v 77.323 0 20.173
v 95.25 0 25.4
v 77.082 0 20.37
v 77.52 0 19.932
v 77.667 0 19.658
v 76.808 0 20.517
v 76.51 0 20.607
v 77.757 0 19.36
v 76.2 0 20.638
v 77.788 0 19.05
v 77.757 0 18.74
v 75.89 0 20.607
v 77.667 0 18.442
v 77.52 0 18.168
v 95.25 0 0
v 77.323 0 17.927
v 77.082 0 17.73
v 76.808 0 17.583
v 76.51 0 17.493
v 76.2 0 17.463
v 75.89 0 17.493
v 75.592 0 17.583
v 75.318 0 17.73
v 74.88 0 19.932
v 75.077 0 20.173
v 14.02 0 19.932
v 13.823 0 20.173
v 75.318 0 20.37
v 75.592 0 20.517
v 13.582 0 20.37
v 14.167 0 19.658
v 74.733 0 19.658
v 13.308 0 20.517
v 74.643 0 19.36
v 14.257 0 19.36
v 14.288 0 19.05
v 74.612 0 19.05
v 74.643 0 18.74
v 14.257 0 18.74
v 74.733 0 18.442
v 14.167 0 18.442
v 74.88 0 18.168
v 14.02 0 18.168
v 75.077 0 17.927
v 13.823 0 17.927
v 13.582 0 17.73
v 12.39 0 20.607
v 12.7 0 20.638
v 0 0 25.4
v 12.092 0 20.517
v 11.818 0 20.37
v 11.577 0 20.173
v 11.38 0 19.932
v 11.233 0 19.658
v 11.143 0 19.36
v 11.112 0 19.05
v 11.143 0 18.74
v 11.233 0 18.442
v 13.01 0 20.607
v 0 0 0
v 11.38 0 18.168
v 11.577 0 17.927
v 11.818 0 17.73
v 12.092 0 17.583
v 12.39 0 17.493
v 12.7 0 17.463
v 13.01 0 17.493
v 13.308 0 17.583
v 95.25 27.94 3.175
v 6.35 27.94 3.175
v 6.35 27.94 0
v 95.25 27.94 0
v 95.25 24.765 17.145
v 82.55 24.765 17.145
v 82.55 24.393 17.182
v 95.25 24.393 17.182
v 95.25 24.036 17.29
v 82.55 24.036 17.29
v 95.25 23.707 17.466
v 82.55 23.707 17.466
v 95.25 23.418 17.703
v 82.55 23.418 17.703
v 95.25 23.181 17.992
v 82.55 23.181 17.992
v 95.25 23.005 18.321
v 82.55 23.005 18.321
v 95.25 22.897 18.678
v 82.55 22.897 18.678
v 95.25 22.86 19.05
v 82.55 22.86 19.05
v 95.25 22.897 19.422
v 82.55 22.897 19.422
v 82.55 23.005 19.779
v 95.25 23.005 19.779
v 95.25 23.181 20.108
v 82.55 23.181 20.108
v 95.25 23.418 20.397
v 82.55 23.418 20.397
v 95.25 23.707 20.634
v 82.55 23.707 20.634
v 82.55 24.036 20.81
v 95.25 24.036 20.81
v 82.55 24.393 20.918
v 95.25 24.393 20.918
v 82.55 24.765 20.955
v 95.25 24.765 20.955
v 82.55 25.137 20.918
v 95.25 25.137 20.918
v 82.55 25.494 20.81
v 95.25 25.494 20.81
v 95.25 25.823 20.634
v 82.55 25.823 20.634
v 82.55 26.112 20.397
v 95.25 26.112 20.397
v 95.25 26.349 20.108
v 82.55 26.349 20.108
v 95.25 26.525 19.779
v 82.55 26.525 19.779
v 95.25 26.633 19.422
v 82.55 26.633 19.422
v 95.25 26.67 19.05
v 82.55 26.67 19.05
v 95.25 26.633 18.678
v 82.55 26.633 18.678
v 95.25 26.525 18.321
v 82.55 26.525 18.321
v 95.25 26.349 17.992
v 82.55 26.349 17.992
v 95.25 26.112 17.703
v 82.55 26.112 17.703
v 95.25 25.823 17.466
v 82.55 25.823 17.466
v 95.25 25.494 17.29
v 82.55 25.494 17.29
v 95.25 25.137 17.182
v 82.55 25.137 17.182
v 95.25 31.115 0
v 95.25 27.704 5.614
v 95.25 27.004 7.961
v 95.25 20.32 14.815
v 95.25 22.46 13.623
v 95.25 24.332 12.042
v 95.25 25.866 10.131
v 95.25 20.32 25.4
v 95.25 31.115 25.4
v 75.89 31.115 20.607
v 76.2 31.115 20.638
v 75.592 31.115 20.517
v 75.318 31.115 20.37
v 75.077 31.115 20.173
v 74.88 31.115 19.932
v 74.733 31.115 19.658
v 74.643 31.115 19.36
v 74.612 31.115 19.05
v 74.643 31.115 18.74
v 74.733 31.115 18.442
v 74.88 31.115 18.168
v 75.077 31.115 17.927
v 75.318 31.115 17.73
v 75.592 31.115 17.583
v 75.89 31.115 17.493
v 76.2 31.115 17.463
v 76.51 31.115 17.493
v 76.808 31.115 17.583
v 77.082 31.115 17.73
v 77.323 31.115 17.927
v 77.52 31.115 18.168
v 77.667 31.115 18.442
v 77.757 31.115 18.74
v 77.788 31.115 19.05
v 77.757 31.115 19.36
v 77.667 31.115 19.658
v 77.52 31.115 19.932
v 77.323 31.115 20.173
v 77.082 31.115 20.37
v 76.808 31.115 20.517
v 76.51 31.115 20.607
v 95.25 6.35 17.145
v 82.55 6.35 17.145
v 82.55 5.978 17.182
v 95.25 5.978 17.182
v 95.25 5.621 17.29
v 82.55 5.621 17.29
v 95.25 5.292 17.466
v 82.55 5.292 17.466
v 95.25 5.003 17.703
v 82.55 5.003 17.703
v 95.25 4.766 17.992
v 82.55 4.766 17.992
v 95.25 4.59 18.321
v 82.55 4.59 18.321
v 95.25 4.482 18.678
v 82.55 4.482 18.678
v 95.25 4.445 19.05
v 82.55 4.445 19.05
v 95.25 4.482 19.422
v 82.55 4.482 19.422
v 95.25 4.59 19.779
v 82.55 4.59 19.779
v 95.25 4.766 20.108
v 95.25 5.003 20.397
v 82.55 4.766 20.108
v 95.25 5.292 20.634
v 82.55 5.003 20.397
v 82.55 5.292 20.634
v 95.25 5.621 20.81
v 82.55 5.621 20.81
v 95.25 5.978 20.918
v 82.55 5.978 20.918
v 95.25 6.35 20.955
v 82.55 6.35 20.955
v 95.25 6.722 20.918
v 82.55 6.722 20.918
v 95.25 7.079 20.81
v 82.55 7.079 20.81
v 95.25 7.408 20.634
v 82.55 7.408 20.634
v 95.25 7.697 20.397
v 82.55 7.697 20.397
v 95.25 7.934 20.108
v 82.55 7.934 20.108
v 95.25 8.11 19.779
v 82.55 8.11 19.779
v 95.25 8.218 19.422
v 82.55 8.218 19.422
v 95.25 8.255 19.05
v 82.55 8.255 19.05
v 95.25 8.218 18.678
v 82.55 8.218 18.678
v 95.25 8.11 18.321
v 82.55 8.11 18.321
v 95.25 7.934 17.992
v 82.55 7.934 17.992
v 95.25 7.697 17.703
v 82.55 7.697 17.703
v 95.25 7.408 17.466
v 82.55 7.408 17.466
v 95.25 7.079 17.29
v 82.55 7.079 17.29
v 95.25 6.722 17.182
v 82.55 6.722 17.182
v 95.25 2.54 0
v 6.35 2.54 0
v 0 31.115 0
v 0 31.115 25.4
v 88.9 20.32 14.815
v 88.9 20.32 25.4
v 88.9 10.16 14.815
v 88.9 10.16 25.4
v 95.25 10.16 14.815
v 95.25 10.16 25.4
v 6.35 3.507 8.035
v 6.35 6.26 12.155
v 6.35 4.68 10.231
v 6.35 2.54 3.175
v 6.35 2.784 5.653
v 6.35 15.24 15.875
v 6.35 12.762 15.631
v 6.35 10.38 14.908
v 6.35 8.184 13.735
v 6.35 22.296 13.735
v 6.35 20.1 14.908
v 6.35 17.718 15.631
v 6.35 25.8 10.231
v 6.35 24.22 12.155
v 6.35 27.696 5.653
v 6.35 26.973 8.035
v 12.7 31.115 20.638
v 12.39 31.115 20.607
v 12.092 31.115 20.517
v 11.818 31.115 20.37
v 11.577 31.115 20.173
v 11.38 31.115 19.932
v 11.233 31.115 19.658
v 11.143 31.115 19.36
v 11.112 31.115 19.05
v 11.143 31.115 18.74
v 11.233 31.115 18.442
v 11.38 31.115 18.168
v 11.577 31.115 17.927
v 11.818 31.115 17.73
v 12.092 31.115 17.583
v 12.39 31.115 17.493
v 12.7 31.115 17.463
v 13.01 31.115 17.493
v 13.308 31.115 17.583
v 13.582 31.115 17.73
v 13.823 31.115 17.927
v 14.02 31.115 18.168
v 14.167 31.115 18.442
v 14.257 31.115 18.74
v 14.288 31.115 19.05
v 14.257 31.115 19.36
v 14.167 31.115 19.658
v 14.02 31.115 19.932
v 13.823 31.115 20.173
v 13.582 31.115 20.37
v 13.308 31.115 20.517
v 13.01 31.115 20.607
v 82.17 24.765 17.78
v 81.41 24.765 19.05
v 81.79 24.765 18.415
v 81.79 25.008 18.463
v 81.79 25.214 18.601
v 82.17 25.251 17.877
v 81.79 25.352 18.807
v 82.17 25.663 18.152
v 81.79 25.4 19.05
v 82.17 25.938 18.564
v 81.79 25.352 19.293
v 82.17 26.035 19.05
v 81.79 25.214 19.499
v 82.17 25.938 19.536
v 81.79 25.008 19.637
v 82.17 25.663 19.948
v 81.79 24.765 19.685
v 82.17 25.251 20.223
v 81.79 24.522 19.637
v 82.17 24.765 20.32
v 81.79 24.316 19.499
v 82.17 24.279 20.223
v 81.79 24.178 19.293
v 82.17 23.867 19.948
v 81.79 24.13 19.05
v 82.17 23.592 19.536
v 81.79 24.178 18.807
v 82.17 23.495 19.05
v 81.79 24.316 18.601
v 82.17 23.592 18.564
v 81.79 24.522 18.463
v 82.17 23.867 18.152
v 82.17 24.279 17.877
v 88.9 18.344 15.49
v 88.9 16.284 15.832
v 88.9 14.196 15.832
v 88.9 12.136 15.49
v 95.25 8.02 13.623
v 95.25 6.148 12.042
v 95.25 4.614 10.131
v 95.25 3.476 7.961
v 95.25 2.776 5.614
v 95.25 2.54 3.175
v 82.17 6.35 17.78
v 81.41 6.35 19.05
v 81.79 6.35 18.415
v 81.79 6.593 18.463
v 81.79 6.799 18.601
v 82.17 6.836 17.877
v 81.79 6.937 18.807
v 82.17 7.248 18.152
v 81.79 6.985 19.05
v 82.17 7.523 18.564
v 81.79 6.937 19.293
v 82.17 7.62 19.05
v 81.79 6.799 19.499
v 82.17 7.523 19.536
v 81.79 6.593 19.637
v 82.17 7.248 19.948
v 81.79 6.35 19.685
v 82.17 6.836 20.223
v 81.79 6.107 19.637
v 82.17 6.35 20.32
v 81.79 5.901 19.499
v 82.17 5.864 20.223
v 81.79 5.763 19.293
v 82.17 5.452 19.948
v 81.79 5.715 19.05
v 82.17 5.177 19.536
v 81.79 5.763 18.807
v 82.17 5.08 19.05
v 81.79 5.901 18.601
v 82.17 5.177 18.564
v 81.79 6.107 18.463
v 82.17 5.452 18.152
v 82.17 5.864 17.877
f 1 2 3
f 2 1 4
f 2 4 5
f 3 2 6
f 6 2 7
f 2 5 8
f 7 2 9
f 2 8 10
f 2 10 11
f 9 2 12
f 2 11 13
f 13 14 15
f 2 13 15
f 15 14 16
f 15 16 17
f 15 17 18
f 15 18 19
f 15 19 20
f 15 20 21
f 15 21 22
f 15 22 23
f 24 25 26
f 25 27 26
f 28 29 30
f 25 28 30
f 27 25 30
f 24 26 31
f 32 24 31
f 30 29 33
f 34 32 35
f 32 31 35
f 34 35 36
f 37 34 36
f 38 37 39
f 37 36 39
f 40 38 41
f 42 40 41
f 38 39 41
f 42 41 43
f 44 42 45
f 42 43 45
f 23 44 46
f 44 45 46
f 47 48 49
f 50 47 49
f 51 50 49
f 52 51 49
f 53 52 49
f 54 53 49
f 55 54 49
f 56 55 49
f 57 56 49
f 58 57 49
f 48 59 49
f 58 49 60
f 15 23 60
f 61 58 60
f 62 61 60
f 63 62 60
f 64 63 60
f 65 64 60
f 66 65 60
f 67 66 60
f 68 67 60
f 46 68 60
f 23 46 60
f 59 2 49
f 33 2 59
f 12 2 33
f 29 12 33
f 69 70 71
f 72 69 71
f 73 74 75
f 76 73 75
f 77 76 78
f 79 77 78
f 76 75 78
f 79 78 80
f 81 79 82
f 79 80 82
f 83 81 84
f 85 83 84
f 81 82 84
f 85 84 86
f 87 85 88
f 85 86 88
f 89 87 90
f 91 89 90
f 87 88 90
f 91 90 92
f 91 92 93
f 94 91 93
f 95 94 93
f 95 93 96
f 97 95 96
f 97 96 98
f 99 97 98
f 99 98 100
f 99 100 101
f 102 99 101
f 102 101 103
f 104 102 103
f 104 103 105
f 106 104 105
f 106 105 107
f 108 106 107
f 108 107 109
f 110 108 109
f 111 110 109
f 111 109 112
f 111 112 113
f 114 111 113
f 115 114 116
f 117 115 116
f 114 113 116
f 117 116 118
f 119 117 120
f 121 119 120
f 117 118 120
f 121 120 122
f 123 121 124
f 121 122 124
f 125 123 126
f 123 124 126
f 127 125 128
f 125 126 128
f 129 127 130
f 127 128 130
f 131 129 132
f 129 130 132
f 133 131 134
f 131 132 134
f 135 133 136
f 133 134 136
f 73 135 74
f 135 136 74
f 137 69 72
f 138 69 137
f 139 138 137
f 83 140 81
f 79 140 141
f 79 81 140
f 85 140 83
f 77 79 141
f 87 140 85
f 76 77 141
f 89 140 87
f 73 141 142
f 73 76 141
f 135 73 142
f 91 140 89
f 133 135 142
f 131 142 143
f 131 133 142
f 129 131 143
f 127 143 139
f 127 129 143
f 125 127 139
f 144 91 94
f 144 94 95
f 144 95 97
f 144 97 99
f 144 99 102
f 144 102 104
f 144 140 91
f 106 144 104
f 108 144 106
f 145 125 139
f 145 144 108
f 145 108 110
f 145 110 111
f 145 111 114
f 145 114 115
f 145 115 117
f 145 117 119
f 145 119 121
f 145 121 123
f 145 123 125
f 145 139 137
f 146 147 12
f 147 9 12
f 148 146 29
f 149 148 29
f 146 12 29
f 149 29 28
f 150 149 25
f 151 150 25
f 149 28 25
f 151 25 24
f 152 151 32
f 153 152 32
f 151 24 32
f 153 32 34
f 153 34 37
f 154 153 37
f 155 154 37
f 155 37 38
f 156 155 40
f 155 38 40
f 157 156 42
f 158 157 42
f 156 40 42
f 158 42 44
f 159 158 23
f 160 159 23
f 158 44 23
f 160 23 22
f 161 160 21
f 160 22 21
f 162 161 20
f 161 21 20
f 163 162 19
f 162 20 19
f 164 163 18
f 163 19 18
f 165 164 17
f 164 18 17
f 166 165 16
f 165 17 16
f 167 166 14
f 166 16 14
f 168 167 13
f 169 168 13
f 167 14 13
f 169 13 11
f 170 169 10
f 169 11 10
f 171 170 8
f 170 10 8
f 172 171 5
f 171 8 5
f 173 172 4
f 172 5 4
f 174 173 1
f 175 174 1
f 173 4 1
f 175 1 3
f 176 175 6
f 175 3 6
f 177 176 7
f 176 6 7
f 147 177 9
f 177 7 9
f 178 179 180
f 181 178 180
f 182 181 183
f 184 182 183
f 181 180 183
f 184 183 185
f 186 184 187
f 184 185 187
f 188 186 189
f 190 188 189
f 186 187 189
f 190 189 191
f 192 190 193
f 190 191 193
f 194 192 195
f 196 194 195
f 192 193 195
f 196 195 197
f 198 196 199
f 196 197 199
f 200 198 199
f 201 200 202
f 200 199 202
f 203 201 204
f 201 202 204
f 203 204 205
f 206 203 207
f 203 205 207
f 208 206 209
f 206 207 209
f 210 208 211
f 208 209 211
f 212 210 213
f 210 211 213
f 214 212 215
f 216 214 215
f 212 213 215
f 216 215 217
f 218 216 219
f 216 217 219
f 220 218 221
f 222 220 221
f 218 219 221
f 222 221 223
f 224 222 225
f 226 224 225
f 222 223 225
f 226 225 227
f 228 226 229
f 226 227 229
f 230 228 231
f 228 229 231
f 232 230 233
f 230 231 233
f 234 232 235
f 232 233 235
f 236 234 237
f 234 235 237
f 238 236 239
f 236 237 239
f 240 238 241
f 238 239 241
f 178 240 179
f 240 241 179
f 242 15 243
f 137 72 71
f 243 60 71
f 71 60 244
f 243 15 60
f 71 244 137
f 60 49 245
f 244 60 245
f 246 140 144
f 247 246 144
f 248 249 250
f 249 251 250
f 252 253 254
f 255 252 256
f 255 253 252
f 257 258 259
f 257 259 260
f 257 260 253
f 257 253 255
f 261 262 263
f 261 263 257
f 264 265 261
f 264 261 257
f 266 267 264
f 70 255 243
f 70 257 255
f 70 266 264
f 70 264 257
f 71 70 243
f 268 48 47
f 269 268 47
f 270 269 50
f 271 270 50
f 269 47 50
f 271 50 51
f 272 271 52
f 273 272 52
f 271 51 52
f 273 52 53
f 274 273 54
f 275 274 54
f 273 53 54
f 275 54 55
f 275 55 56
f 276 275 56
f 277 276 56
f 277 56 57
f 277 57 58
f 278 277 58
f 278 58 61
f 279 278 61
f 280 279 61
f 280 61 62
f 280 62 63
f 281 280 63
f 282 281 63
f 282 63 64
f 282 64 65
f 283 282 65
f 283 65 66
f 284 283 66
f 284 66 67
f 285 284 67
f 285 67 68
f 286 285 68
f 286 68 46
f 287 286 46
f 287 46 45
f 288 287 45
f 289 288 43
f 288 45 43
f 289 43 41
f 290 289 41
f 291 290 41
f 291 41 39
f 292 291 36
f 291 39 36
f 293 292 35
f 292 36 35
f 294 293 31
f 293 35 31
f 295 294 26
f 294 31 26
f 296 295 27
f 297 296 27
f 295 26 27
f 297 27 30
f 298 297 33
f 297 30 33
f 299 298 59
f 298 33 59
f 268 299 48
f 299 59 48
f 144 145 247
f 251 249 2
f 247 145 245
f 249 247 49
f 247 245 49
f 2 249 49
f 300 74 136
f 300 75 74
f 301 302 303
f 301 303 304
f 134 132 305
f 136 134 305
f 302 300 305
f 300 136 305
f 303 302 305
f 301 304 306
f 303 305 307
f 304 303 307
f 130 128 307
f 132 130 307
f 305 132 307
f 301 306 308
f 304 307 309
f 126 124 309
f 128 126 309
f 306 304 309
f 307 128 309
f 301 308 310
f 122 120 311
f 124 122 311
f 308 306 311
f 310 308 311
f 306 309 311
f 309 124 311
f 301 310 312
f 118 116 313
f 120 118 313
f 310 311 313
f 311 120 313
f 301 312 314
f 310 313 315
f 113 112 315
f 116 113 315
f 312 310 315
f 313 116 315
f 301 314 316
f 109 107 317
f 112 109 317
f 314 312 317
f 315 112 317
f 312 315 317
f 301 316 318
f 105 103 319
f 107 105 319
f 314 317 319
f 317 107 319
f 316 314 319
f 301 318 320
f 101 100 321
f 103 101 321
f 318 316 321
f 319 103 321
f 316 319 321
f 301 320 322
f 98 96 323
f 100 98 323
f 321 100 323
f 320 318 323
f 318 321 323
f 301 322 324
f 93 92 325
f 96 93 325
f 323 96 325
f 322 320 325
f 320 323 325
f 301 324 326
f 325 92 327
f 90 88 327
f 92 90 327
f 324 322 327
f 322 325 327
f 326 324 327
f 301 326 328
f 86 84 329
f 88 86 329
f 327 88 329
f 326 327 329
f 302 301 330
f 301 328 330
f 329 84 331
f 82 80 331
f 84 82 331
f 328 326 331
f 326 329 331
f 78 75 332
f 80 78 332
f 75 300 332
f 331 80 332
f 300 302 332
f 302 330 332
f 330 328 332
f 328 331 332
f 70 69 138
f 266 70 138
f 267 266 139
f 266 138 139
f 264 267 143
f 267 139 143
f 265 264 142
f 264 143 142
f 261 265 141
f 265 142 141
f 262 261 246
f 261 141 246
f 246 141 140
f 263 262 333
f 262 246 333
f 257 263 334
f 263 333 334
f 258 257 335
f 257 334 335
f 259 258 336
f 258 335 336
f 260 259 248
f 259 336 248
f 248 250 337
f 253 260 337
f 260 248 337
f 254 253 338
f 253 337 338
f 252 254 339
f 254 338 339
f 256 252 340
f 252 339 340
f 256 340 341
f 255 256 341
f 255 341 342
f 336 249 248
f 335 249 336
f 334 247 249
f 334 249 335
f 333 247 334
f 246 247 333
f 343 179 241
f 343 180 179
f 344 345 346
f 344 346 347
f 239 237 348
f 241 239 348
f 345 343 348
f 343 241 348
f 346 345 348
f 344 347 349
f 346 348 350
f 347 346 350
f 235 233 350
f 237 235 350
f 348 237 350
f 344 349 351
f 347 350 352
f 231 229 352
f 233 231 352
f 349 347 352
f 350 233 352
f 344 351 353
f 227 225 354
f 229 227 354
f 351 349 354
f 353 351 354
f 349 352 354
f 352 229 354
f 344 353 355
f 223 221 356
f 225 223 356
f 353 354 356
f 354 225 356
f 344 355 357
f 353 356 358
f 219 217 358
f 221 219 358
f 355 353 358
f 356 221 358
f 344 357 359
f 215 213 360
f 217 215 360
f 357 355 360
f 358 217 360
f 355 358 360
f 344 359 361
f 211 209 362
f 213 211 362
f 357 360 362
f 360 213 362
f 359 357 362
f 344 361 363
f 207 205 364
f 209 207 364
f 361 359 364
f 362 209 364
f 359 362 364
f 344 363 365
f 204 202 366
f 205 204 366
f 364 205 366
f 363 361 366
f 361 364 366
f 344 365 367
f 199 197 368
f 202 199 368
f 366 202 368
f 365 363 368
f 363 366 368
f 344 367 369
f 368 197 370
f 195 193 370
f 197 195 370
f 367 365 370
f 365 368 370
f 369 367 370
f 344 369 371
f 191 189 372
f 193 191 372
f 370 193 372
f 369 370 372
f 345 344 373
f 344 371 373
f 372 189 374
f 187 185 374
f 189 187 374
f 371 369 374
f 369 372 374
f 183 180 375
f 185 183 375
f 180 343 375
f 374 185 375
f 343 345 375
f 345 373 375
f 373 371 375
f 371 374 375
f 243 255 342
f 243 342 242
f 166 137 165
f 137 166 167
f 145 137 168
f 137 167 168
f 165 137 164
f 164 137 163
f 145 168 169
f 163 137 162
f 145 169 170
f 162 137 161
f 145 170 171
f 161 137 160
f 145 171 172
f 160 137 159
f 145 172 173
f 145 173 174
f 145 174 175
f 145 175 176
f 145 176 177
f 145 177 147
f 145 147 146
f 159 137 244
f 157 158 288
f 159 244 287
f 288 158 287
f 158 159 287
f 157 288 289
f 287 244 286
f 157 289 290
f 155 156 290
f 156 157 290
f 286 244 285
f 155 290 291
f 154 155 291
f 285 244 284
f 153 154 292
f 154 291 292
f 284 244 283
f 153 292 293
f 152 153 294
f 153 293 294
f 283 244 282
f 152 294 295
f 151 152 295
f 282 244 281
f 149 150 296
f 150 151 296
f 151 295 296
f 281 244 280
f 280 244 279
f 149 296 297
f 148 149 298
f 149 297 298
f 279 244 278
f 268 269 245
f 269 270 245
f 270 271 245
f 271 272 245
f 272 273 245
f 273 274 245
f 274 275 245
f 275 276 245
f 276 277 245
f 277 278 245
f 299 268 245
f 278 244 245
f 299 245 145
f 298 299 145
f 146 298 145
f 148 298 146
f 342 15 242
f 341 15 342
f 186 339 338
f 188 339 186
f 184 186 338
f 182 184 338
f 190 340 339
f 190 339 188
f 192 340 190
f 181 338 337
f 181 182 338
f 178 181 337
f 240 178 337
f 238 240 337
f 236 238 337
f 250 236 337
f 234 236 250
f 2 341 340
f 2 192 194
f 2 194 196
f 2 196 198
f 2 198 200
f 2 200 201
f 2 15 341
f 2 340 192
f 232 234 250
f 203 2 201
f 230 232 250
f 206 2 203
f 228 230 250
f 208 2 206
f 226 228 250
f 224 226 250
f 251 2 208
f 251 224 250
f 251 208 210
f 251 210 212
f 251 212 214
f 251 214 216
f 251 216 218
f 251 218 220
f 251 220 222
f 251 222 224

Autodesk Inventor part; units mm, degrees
ref_plane "YZ Plane" through (0, 0, 0) normal (1, 0, 0) x (0, 1, 0)
ref_plane "XZ Plane" through (0, 0, 0) normal (0, 1, 0) x (-1, 0, 0)
ref_plane "XY Plane" through (0, 0, 0) normal (0, 0, 1) x (1, 0, 0)
sketch "Sketch1" plane through (0, 0, 0) normal (1, 0, 0) x (0, 1, 0)
  line L0 (0, 0) -> (31.115, 0)
  line L1 (31.115, 0) -> (31.115, 25.4)
  line L2 (31.115, 25.4) -> (0, 25.4)
  line L3 (0, 25.4) -> (0, 0)
  dimension "d0" = 25.4
  dimension "d1" = 31.115
extrude "Extrusion1" add sketch "Sketch1" along normal blind 95.25
sketch "Sketch2" plane through (95.25, 0, 0) normal (1, 0, 0) x (0, 0, -1)
  arc A0 (-3.175, 27.94) -> (-3.175, 2.54) centre (-3.175, 15.24) ccw
  line L0 (0, 0) -> (0, 31.115) projected
  line L1 (-25.4, 0) -> (0, 0) projected
  line L2 (-3.175, 27.94) -> (0, 27.94)
  line L3 (-3.175, 2.54) -> (0, 2.54)
  dimension "d4" = 3.175
  dimension "d5" = 15.24
  dimension "d6" = 25.4
extrude "Extrusion2" cut sketch "Sketch2" against normal blind 88.9
sketch "Sketch3" plane through (0, 31.115, 25.4) normal (0, 1, 0) x (1, 0, 0)
  line L0 (0, 25.4) -> (0, 0) projected
  line L1 (95.25, 25.4) -> (95.25, 0) projected
  line L2 (0, 0) -> (95.25, 0) projected
  point P0 (12.7, 6.35)
  point P1 (76.2, 6.35)
  dimension "d9" = 0
  dimension "d10" = 12.7
  dimension "d12" = 6.35
  dimension "d35" = 76.2
hole "Hole1" at (12.7, 31.115, 19.05) at (76.2, 31.115, 19.05) direction (0, -1, 0) diameter 3.175 end through all
sketch "Sketch4" plane through (95.25, 0, 0) normal (1, 0, 0) x (0, 0, -1)
  line L0 (-10.782, 20.32) -> (-30.1642, 20.32)
  line L1 (-30.1642, 20.32) -> (-30.1642, 10.16)
  line L2 (-30.1642, 10.16) -> (-10.782, 10.16)
  line L3 (-10.782, 10.16) -> (-10.782, 20.32)
  line L4 (-25.4, 0) -> (0, 0) projected
  dimension "d20" = 10.16
  dimension "d21" = 10.16
extrude "Extrusion3" cut sketch "Sketch4" against normal blind 6.35
sketch "Sketch5" plane through (95.25, 0, 0) normal (1, 0, 0) x (0, 0, -1)
  line L0 (-25.4, 10.16) -> (-25.4, 0) projected
  line L1 (-25.4, 0) -> (0, 0) projected
  line L2 (-25.4, 31.115) -> (-25.4, 20.32) projected
  line L3 (0, 31.115) -> (-25.4, 31.115) projected
  point P0 (-19.05, 24.765)
  point P1 (-19.05, 6.35)
  dimension "d24" = 6.35
  dimension "d25" = 6.35
  dimension "d26" = 6.35
  dimension "d27" = 6.35
hole "Hole2" at (95.25, 24.765, 19.05) at (95.25, 6.35, 19.05) direction (-1, 0, 0) diameter 3.81 depth 12.7 tip angle 118.188
properties part number "bATTERYrAILS"
